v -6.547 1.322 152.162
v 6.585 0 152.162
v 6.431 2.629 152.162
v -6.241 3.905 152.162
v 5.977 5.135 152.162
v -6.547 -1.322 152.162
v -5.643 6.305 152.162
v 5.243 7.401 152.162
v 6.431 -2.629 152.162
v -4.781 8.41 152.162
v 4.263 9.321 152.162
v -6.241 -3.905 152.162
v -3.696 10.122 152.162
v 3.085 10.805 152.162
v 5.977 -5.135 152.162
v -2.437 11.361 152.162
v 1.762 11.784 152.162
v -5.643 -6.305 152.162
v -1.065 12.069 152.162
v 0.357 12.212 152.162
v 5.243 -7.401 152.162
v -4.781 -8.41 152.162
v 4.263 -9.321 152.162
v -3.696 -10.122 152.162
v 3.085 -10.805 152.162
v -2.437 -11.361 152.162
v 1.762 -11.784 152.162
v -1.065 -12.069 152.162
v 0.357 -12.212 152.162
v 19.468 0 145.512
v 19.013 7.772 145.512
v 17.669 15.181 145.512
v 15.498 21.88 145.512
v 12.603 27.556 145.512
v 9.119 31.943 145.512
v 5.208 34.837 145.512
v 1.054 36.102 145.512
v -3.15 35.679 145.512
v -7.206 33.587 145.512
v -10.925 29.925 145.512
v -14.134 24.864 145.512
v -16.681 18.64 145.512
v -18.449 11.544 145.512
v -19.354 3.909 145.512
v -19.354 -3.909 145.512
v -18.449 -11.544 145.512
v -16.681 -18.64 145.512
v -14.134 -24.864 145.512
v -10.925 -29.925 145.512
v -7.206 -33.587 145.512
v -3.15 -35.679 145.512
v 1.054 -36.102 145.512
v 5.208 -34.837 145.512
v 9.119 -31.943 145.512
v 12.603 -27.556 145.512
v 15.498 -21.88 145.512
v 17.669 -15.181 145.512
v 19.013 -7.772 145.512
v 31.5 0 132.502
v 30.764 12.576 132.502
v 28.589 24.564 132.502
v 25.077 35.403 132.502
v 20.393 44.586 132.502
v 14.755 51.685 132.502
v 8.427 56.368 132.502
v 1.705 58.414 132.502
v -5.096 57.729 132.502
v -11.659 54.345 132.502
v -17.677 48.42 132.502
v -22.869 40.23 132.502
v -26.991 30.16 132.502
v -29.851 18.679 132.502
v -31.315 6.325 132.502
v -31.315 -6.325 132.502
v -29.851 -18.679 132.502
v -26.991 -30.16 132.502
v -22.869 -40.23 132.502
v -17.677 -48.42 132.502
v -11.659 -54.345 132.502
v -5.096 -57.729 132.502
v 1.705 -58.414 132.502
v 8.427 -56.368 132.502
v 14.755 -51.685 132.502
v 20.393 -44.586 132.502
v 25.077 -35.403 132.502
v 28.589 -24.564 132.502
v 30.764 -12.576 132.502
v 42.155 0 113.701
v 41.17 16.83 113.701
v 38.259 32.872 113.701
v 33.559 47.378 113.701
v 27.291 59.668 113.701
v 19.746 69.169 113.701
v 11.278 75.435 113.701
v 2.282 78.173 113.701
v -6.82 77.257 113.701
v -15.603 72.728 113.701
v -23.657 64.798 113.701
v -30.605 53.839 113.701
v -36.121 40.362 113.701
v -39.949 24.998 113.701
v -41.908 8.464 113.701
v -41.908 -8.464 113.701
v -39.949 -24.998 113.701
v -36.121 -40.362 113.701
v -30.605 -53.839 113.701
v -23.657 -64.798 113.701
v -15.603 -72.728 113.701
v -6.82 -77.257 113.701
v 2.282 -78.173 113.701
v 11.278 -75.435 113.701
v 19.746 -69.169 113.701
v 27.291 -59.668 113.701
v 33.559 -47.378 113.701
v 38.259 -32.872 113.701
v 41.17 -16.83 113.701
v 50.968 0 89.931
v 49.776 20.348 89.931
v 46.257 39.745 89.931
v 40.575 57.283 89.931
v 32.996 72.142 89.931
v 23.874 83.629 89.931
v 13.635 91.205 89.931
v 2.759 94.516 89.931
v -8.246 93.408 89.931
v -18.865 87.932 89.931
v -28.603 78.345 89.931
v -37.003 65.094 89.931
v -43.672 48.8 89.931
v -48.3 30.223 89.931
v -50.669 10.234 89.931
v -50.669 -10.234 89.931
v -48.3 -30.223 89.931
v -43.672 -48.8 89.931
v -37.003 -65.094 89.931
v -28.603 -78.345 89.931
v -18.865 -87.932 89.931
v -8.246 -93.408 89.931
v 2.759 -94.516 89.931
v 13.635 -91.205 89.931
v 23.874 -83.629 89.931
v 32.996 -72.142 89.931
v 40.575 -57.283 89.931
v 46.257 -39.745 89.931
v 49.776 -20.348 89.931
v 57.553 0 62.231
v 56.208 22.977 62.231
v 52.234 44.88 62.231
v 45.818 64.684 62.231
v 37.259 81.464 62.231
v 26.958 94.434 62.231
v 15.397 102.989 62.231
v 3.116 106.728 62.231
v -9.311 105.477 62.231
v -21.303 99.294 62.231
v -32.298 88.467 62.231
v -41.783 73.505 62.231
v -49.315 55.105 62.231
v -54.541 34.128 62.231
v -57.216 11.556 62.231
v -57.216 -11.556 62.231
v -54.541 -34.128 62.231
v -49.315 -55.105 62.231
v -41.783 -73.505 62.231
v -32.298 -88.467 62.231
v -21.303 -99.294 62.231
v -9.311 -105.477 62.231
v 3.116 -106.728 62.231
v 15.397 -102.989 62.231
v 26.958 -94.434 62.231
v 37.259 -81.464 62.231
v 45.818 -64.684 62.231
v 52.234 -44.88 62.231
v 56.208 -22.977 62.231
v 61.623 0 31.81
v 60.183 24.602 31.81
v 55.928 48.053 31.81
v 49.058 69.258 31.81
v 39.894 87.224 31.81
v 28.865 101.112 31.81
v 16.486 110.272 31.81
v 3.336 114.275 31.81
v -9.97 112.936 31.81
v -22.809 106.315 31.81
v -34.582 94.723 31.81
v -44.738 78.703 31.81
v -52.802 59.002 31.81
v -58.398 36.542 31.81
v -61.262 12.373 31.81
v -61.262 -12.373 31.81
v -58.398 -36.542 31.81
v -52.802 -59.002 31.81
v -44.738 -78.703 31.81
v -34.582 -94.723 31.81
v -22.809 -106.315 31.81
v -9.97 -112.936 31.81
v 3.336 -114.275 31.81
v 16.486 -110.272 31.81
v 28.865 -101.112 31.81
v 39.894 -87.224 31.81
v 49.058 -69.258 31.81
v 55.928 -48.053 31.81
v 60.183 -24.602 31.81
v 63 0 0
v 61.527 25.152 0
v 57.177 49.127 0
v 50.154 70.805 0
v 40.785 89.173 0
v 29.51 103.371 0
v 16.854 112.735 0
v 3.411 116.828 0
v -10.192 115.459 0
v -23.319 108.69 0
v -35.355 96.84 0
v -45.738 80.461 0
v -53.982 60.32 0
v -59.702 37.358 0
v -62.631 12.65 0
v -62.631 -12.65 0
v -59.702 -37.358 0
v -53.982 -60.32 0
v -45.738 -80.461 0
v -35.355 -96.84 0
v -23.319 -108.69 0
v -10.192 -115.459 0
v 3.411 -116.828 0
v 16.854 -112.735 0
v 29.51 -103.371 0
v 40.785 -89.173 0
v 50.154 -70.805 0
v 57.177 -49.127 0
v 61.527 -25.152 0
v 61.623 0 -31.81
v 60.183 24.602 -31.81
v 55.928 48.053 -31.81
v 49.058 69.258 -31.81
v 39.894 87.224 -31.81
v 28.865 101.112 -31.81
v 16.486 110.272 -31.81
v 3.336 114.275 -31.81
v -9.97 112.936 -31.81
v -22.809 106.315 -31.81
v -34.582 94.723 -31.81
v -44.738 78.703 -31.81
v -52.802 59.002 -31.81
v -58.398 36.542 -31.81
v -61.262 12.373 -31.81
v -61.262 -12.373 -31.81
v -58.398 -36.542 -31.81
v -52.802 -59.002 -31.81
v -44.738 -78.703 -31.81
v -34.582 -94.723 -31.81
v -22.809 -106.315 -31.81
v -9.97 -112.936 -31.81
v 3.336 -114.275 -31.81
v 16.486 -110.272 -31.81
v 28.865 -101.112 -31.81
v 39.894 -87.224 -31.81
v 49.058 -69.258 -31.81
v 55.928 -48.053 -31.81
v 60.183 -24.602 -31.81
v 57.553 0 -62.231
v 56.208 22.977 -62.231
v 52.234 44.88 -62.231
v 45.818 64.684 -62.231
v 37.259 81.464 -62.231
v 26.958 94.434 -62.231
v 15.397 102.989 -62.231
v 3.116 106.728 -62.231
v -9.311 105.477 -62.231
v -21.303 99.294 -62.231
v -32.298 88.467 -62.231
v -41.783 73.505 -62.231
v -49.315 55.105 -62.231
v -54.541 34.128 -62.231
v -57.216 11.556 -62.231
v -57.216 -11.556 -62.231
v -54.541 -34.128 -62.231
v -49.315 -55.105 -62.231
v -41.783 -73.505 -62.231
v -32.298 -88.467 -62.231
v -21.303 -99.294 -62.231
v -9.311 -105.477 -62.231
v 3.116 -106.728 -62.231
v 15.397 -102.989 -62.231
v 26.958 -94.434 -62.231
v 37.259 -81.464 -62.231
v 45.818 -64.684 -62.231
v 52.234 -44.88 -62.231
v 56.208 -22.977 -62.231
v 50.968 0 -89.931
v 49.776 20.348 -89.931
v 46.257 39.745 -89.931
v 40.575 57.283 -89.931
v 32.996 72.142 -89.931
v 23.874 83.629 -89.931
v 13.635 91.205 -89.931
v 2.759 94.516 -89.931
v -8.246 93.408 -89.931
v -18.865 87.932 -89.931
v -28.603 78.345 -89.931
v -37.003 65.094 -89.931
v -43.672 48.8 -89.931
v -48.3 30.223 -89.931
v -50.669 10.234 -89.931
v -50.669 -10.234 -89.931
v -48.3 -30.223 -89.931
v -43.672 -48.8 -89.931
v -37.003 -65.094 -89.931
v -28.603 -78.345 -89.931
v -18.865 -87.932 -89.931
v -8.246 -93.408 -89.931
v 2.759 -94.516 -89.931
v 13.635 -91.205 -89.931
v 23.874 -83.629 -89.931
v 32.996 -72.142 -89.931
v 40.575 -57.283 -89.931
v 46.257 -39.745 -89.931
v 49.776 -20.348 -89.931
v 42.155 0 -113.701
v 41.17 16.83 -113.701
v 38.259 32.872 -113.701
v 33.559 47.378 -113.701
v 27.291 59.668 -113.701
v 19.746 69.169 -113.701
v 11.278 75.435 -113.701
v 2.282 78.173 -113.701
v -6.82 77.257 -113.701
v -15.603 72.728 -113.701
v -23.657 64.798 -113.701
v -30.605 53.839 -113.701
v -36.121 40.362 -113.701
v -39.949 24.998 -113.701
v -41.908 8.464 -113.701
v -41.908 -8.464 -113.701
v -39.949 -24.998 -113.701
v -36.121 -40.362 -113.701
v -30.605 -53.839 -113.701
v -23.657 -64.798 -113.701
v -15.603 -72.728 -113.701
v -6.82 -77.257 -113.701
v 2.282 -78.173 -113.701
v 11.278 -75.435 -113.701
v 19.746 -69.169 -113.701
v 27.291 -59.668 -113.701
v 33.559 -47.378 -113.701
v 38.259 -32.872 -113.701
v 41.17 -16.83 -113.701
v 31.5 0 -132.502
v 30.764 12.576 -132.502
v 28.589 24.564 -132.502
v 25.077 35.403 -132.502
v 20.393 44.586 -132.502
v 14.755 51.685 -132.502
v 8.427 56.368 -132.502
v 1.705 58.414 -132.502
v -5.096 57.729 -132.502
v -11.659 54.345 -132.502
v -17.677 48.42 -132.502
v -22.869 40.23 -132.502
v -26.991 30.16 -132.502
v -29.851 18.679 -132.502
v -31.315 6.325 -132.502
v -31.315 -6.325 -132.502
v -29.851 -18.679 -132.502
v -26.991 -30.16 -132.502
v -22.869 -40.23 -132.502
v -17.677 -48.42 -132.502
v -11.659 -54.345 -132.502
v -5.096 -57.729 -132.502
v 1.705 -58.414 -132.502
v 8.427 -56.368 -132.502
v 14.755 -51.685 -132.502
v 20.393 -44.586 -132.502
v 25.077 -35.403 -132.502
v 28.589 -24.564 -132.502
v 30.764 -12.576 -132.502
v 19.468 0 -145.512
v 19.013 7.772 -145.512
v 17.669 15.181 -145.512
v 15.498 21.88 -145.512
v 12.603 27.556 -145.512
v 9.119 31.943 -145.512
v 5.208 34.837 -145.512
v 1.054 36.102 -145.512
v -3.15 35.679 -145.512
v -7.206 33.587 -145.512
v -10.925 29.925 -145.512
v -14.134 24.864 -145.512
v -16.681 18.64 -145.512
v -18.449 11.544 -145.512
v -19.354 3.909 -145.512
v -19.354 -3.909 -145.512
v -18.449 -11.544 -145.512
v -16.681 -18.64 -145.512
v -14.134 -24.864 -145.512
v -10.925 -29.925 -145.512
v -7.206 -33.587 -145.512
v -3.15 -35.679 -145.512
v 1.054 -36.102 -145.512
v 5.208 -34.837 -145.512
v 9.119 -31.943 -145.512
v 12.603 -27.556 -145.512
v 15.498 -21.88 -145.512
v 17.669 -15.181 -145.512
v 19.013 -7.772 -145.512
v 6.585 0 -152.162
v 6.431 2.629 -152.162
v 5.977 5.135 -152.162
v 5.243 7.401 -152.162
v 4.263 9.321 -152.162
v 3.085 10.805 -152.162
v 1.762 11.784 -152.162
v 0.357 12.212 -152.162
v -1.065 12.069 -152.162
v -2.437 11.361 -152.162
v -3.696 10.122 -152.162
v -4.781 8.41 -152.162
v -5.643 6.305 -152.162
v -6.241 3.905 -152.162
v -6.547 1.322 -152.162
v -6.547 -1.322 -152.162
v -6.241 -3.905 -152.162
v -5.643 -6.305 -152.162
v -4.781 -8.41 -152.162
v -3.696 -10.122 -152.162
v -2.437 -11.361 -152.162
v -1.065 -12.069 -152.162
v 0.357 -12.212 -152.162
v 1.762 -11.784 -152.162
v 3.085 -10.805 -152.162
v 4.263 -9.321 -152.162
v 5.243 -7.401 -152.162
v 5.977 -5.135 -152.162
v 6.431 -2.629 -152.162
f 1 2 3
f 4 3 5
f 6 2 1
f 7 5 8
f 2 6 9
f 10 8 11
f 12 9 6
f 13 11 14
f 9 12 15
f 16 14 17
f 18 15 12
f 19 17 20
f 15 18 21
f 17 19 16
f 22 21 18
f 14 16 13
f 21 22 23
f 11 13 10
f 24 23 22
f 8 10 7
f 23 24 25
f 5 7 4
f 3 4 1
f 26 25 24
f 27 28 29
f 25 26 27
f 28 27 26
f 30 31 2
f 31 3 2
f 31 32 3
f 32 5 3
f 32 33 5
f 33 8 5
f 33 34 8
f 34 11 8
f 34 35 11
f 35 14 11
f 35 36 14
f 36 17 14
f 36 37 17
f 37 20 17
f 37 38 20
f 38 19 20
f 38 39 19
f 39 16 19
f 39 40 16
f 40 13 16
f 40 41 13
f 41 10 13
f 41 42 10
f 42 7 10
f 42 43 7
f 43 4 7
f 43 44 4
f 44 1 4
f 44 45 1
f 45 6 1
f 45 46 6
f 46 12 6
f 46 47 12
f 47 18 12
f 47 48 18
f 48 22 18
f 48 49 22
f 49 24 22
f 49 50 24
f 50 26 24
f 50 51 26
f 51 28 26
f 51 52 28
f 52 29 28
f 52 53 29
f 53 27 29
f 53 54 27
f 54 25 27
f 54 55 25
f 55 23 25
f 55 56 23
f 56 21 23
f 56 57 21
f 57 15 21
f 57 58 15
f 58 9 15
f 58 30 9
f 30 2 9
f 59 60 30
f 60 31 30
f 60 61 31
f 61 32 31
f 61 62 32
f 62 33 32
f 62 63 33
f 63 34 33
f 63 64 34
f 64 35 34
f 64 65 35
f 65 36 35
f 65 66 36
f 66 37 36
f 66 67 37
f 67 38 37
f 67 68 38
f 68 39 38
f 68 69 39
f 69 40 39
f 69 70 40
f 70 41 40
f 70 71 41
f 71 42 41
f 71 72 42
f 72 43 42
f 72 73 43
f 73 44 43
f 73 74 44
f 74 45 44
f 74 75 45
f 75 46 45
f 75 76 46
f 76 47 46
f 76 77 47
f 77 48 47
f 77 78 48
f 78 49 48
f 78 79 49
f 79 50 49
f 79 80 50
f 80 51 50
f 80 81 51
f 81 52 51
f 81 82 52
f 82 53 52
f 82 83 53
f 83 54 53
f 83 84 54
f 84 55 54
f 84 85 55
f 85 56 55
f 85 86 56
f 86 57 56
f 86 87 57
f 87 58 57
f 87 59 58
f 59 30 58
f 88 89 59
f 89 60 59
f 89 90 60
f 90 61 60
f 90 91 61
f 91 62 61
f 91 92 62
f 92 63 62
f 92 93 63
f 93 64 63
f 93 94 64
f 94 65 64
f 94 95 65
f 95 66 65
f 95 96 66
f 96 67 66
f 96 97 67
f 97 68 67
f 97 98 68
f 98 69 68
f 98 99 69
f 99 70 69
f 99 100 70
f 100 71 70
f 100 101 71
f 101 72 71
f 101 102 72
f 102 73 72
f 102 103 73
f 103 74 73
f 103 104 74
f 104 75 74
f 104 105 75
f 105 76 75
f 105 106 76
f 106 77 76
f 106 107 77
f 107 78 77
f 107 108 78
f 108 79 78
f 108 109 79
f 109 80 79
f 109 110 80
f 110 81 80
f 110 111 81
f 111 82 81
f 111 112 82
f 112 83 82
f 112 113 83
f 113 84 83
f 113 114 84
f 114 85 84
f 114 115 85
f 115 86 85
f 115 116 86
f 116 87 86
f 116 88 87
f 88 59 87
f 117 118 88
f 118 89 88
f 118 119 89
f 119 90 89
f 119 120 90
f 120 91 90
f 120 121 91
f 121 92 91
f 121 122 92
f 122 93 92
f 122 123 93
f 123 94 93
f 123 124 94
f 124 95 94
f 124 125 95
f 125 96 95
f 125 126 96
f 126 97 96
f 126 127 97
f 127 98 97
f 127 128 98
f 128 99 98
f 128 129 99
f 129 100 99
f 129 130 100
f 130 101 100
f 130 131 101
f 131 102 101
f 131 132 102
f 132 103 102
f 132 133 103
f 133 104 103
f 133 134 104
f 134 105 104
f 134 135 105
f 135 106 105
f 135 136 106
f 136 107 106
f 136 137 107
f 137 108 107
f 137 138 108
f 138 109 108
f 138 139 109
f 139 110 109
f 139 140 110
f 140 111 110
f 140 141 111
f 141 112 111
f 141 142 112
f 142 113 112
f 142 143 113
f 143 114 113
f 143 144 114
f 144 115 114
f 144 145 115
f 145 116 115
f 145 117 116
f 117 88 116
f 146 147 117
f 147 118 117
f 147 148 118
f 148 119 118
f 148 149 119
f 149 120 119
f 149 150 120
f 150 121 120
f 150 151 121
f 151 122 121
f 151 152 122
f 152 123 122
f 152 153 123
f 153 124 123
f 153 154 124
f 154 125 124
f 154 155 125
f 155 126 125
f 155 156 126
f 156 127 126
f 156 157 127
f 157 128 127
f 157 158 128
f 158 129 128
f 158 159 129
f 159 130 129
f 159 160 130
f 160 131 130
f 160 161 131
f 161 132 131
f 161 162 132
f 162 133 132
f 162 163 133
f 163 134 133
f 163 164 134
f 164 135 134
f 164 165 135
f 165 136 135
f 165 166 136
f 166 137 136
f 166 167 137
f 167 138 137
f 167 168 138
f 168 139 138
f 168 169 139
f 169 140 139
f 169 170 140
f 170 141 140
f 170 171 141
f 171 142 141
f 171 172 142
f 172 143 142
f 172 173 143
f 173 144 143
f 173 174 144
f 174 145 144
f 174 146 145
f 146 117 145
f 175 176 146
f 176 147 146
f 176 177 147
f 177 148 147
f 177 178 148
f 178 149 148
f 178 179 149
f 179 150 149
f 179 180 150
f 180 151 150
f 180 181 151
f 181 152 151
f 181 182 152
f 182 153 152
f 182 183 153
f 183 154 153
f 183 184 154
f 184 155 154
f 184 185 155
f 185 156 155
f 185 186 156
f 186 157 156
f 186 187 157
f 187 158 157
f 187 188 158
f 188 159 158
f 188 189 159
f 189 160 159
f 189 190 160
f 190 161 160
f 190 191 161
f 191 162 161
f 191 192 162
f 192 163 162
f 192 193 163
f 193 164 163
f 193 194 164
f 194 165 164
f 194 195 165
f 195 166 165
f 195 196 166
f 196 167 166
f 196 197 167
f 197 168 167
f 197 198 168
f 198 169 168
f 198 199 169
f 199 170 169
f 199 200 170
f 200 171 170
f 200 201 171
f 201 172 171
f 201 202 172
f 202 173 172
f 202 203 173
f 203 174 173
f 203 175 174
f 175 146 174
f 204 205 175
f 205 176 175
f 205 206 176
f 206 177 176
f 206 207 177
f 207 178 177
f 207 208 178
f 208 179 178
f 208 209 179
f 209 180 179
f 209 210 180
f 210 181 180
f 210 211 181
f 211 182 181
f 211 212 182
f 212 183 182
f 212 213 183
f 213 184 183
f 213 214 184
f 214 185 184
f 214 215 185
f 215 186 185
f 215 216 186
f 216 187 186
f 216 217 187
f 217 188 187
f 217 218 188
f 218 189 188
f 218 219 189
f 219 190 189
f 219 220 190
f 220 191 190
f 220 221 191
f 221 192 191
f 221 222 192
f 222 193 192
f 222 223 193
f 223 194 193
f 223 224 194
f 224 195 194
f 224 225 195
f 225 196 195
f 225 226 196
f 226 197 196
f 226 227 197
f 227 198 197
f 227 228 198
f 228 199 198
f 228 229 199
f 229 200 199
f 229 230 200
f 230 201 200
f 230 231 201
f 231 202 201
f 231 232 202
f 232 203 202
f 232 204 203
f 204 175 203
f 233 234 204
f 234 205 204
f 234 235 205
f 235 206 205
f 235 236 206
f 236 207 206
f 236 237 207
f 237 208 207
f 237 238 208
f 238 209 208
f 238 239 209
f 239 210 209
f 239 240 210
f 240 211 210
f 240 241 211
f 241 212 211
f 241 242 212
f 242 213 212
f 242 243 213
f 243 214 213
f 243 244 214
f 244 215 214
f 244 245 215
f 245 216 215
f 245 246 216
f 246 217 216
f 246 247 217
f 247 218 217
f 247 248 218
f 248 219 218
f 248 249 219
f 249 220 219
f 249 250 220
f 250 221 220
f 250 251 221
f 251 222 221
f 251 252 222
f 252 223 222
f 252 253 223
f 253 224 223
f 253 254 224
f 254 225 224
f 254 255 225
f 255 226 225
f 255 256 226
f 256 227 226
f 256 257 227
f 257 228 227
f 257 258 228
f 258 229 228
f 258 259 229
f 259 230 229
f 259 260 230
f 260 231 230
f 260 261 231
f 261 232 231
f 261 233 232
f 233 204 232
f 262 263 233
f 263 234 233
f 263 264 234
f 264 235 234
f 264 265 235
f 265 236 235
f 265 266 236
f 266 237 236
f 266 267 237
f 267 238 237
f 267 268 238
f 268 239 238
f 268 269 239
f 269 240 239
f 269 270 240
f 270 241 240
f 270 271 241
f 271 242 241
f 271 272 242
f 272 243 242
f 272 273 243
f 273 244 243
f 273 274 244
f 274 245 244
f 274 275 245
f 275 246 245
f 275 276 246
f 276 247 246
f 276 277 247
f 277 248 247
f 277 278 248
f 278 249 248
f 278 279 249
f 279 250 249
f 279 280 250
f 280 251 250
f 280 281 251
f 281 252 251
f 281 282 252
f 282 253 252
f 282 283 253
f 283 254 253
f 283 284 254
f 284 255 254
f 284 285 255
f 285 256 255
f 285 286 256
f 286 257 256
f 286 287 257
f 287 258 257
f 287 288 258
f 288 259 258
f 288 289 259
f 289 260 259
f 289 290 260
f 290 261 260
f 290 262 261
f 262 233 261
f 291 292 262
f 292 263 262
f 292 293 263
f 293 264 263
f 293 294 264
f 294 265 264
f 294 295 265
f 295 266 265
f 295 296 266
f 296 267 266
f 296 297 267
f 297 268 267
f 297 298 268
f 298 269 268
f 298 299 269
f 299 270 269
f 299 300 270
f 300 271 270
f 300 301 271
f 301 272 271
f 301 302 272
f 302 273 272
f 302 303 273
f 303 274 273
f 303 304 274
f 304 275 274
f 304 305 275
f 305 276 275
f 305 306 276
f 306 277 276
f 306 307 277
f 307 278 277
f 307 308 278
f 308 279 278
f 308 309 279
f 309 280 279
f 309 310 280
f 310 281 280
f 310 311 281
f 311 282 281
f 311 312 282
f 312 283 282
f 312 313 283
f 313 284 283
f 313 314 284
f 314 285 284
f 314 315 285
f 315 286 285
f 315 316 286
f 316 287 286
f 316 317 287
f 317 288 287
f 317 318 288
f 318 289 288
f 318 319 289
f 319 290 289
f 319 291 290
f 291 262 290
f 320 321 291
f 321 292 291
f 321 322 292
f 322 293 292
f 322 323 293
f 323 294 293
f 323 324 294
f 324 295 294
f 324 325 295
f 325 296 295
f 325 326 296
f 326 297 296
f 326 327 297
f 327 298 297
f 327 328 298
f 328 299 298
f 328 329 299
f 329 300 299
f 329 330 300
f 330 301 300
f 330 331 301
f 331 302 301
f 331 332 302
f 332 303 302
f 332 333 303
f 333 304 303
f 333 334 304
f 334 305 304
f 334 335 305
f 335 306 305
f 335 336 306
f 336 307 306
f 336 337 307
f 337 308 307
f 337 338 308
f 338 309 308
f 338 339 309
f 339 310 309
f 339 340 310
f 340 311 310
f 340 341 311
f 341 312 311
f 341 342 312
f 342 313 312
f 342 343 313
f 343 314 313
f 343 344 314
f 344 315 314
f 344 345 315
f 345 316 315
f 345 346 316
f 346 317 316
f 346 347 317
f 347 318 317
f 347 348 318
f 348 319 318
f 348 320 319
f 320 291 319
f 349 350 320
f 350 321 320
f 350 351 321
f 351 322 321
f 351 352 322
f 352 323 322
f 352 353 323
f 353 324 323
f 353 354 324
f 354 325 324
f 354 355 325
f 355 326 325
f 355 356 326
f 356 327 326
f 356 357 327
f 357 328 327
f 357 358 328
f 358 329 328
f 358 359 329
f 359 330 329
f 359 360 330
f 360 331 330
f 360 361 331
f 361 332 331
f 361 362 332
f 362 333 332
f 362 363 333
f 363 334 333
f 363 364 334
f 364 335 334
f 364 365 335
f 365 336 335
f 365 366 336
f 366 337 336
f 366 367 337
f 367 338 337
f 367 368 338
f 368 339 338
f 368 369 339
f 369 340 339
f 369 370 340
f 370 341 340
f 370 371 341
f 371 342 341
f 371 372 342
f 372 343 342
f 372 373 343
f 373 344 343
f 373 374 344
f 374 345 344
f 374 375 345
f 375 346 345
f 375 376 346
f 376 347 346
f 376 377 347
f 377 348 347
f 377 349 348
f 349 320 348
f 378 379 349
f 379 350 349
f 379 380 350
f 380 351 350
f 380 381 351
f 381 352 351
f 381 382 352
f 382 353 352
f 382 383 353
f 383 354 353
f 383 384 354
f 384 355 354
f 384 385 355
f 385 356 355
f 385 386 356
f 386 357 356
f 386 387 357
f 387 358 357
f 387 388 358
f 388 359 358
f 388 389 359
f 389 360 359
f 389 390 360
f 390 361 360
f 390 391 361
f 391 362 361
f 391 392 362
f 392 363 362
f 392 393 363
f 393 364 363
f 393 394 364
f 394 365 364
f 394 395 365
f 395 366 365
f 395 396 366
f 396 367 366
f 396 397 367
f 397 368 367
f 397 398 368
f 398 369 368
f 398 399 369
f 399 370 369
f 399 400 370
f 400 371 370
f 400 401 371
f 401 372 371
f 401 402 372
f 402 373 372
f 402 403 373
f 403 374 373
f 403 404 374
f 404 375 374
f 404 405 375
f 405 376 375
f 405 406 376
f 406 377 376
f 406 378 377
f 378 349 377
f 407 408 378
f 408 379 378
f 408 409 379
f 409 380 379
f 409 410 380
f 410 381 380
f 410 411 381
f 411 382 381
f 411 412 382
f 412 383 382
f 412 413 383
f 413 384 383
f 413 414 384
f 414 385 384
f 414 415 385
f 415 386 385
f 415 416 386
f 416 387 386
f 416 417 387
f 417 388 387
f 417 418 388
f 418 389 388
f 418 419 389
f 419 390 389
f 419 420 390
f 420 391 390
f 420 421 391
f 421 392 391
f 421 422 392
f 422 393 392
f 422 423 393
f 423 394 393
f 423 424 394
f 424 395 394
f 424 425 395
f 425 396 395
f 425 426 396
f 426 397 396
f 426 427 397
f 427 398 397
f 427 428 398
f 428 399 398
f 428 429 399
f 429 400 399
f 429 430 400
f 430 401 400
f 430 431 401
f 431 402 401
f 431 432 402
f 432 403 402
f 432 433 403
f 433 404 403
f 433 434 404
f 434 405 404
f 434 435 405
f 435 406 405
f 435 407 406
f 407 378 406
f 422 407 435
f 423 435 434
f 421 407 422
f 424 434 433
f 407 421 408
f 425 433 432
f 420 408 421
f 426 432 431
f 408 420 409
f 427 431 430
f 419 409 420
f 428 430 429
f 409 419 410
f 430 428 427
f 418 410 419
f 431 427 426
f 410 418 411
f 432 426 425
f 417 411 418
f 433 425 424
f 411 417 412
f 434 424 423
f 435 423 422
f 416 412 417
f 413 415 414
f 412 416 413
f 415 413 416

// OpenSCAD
// Generated by SolidPython 1.0.1 on 2020-07-29 00:46:47


scale(v = [7, 13, 17]) {
	sphere(r = 9);
}
/***********************************************
*********      SolidPython code:      **********
************************************************
 
# import packages: SolidPython
from solid import *
from solid.utils import *
from itertools import chain, combinations, permutations


class Resize:

    def __init__(self, scad_file):
        self.scad_file = scad_file
        #self.scad_file = import_scad(scad_file)
        # cone/cylinder param:
        self.r1 = 0
        self.r2 = 0
        self.h = 0
        # rectangular prism param:
        self.w = 0
        self.l = 0
        # ellipse param:
        self.r = 0

    # import OpenScad code (file name corresponds to shape)


    # classify shape + parameters
    def assign(self, param1, param2, param3):
        if self.scad_file == 'cone.scad':
            self.r1 = param1
            self.r2 = param2
            self.h = param3
        elif self.scad_file == 'cylinder.scad':
            self.r1 = param1
            self.r2 = param2
            self.h = param3
        elif self.scad_file == 'rectangularPrism.scad':
            self.h = param1
            self.l = param2
            self.w = param3
        else:
            self.r = param1
            self.h = param2

    # resize parameters
    def iterate(self):
        x = range(3, 20, 2)
        i = 1
        if self.scad_file == 'cone.scad':
            tempList = list(permutations(x, 2))
            for temp in tempList:
                param1 = temp[0]
                param2 = temp[1]
                filepath = 'produced_scad_files/' + 'cone' + str(param1) + '_' + str(param2) + '_' + '.scad'
                scad_render_to_file(cylinder(h=param1, r1=param2, r2=0), filepath)

        elif self.scad_file == 'cylinder.scad':
            tempList = list(permutations(x, 3))
            for temp in tempList:
                param1 = temp[0]
                param2 = temp[1]
                filepath = 'produced_scad_files/' + 'cylinder' + str(param1) + '_' + str(param2) + '_' + '.scad'
                scad_render_to_file(cylinder(h=param1, r1=param2, r2=param2), filepath)

        elif self.scad_file == 'rectangularPrism.scad':
            tempList = list(permutations(x, 3))
            for temp in tempList:
                param1 = temp[0]
                param2 = temp[1]
                param3 = temp[2]
                filepath = 'produced_scad_files/' + 'rectangularPrism' + str(param1) + '_' + str(param2) + '_' + str(
                    param3) + '.scad'
                scad_render_to_file(cube(size=(param1, param2, param3)), filepath)

        elif self.scad_file == 'ellipse.scad':
            tempList = list(permutations(x, 4))
            for temp in tempList:
                param1 = temp[0]
                param2 = temp[1]
                param3 = temp[2]
                param4 = temp[3]
                filepath = 'produced_scad_files/' + 'ellipse' + str(param1) + '_' + str(param2) + '_' + str(param3) + '_' + str(param4) + '.scad'
                scad_render_to_file(scale([param1, param2, param3])(sphere(r=param4)), filepath)

    def render_to_scadfile(self):
        scad_render_to_file(scad, 'example.scad') 
 
************************************************/
